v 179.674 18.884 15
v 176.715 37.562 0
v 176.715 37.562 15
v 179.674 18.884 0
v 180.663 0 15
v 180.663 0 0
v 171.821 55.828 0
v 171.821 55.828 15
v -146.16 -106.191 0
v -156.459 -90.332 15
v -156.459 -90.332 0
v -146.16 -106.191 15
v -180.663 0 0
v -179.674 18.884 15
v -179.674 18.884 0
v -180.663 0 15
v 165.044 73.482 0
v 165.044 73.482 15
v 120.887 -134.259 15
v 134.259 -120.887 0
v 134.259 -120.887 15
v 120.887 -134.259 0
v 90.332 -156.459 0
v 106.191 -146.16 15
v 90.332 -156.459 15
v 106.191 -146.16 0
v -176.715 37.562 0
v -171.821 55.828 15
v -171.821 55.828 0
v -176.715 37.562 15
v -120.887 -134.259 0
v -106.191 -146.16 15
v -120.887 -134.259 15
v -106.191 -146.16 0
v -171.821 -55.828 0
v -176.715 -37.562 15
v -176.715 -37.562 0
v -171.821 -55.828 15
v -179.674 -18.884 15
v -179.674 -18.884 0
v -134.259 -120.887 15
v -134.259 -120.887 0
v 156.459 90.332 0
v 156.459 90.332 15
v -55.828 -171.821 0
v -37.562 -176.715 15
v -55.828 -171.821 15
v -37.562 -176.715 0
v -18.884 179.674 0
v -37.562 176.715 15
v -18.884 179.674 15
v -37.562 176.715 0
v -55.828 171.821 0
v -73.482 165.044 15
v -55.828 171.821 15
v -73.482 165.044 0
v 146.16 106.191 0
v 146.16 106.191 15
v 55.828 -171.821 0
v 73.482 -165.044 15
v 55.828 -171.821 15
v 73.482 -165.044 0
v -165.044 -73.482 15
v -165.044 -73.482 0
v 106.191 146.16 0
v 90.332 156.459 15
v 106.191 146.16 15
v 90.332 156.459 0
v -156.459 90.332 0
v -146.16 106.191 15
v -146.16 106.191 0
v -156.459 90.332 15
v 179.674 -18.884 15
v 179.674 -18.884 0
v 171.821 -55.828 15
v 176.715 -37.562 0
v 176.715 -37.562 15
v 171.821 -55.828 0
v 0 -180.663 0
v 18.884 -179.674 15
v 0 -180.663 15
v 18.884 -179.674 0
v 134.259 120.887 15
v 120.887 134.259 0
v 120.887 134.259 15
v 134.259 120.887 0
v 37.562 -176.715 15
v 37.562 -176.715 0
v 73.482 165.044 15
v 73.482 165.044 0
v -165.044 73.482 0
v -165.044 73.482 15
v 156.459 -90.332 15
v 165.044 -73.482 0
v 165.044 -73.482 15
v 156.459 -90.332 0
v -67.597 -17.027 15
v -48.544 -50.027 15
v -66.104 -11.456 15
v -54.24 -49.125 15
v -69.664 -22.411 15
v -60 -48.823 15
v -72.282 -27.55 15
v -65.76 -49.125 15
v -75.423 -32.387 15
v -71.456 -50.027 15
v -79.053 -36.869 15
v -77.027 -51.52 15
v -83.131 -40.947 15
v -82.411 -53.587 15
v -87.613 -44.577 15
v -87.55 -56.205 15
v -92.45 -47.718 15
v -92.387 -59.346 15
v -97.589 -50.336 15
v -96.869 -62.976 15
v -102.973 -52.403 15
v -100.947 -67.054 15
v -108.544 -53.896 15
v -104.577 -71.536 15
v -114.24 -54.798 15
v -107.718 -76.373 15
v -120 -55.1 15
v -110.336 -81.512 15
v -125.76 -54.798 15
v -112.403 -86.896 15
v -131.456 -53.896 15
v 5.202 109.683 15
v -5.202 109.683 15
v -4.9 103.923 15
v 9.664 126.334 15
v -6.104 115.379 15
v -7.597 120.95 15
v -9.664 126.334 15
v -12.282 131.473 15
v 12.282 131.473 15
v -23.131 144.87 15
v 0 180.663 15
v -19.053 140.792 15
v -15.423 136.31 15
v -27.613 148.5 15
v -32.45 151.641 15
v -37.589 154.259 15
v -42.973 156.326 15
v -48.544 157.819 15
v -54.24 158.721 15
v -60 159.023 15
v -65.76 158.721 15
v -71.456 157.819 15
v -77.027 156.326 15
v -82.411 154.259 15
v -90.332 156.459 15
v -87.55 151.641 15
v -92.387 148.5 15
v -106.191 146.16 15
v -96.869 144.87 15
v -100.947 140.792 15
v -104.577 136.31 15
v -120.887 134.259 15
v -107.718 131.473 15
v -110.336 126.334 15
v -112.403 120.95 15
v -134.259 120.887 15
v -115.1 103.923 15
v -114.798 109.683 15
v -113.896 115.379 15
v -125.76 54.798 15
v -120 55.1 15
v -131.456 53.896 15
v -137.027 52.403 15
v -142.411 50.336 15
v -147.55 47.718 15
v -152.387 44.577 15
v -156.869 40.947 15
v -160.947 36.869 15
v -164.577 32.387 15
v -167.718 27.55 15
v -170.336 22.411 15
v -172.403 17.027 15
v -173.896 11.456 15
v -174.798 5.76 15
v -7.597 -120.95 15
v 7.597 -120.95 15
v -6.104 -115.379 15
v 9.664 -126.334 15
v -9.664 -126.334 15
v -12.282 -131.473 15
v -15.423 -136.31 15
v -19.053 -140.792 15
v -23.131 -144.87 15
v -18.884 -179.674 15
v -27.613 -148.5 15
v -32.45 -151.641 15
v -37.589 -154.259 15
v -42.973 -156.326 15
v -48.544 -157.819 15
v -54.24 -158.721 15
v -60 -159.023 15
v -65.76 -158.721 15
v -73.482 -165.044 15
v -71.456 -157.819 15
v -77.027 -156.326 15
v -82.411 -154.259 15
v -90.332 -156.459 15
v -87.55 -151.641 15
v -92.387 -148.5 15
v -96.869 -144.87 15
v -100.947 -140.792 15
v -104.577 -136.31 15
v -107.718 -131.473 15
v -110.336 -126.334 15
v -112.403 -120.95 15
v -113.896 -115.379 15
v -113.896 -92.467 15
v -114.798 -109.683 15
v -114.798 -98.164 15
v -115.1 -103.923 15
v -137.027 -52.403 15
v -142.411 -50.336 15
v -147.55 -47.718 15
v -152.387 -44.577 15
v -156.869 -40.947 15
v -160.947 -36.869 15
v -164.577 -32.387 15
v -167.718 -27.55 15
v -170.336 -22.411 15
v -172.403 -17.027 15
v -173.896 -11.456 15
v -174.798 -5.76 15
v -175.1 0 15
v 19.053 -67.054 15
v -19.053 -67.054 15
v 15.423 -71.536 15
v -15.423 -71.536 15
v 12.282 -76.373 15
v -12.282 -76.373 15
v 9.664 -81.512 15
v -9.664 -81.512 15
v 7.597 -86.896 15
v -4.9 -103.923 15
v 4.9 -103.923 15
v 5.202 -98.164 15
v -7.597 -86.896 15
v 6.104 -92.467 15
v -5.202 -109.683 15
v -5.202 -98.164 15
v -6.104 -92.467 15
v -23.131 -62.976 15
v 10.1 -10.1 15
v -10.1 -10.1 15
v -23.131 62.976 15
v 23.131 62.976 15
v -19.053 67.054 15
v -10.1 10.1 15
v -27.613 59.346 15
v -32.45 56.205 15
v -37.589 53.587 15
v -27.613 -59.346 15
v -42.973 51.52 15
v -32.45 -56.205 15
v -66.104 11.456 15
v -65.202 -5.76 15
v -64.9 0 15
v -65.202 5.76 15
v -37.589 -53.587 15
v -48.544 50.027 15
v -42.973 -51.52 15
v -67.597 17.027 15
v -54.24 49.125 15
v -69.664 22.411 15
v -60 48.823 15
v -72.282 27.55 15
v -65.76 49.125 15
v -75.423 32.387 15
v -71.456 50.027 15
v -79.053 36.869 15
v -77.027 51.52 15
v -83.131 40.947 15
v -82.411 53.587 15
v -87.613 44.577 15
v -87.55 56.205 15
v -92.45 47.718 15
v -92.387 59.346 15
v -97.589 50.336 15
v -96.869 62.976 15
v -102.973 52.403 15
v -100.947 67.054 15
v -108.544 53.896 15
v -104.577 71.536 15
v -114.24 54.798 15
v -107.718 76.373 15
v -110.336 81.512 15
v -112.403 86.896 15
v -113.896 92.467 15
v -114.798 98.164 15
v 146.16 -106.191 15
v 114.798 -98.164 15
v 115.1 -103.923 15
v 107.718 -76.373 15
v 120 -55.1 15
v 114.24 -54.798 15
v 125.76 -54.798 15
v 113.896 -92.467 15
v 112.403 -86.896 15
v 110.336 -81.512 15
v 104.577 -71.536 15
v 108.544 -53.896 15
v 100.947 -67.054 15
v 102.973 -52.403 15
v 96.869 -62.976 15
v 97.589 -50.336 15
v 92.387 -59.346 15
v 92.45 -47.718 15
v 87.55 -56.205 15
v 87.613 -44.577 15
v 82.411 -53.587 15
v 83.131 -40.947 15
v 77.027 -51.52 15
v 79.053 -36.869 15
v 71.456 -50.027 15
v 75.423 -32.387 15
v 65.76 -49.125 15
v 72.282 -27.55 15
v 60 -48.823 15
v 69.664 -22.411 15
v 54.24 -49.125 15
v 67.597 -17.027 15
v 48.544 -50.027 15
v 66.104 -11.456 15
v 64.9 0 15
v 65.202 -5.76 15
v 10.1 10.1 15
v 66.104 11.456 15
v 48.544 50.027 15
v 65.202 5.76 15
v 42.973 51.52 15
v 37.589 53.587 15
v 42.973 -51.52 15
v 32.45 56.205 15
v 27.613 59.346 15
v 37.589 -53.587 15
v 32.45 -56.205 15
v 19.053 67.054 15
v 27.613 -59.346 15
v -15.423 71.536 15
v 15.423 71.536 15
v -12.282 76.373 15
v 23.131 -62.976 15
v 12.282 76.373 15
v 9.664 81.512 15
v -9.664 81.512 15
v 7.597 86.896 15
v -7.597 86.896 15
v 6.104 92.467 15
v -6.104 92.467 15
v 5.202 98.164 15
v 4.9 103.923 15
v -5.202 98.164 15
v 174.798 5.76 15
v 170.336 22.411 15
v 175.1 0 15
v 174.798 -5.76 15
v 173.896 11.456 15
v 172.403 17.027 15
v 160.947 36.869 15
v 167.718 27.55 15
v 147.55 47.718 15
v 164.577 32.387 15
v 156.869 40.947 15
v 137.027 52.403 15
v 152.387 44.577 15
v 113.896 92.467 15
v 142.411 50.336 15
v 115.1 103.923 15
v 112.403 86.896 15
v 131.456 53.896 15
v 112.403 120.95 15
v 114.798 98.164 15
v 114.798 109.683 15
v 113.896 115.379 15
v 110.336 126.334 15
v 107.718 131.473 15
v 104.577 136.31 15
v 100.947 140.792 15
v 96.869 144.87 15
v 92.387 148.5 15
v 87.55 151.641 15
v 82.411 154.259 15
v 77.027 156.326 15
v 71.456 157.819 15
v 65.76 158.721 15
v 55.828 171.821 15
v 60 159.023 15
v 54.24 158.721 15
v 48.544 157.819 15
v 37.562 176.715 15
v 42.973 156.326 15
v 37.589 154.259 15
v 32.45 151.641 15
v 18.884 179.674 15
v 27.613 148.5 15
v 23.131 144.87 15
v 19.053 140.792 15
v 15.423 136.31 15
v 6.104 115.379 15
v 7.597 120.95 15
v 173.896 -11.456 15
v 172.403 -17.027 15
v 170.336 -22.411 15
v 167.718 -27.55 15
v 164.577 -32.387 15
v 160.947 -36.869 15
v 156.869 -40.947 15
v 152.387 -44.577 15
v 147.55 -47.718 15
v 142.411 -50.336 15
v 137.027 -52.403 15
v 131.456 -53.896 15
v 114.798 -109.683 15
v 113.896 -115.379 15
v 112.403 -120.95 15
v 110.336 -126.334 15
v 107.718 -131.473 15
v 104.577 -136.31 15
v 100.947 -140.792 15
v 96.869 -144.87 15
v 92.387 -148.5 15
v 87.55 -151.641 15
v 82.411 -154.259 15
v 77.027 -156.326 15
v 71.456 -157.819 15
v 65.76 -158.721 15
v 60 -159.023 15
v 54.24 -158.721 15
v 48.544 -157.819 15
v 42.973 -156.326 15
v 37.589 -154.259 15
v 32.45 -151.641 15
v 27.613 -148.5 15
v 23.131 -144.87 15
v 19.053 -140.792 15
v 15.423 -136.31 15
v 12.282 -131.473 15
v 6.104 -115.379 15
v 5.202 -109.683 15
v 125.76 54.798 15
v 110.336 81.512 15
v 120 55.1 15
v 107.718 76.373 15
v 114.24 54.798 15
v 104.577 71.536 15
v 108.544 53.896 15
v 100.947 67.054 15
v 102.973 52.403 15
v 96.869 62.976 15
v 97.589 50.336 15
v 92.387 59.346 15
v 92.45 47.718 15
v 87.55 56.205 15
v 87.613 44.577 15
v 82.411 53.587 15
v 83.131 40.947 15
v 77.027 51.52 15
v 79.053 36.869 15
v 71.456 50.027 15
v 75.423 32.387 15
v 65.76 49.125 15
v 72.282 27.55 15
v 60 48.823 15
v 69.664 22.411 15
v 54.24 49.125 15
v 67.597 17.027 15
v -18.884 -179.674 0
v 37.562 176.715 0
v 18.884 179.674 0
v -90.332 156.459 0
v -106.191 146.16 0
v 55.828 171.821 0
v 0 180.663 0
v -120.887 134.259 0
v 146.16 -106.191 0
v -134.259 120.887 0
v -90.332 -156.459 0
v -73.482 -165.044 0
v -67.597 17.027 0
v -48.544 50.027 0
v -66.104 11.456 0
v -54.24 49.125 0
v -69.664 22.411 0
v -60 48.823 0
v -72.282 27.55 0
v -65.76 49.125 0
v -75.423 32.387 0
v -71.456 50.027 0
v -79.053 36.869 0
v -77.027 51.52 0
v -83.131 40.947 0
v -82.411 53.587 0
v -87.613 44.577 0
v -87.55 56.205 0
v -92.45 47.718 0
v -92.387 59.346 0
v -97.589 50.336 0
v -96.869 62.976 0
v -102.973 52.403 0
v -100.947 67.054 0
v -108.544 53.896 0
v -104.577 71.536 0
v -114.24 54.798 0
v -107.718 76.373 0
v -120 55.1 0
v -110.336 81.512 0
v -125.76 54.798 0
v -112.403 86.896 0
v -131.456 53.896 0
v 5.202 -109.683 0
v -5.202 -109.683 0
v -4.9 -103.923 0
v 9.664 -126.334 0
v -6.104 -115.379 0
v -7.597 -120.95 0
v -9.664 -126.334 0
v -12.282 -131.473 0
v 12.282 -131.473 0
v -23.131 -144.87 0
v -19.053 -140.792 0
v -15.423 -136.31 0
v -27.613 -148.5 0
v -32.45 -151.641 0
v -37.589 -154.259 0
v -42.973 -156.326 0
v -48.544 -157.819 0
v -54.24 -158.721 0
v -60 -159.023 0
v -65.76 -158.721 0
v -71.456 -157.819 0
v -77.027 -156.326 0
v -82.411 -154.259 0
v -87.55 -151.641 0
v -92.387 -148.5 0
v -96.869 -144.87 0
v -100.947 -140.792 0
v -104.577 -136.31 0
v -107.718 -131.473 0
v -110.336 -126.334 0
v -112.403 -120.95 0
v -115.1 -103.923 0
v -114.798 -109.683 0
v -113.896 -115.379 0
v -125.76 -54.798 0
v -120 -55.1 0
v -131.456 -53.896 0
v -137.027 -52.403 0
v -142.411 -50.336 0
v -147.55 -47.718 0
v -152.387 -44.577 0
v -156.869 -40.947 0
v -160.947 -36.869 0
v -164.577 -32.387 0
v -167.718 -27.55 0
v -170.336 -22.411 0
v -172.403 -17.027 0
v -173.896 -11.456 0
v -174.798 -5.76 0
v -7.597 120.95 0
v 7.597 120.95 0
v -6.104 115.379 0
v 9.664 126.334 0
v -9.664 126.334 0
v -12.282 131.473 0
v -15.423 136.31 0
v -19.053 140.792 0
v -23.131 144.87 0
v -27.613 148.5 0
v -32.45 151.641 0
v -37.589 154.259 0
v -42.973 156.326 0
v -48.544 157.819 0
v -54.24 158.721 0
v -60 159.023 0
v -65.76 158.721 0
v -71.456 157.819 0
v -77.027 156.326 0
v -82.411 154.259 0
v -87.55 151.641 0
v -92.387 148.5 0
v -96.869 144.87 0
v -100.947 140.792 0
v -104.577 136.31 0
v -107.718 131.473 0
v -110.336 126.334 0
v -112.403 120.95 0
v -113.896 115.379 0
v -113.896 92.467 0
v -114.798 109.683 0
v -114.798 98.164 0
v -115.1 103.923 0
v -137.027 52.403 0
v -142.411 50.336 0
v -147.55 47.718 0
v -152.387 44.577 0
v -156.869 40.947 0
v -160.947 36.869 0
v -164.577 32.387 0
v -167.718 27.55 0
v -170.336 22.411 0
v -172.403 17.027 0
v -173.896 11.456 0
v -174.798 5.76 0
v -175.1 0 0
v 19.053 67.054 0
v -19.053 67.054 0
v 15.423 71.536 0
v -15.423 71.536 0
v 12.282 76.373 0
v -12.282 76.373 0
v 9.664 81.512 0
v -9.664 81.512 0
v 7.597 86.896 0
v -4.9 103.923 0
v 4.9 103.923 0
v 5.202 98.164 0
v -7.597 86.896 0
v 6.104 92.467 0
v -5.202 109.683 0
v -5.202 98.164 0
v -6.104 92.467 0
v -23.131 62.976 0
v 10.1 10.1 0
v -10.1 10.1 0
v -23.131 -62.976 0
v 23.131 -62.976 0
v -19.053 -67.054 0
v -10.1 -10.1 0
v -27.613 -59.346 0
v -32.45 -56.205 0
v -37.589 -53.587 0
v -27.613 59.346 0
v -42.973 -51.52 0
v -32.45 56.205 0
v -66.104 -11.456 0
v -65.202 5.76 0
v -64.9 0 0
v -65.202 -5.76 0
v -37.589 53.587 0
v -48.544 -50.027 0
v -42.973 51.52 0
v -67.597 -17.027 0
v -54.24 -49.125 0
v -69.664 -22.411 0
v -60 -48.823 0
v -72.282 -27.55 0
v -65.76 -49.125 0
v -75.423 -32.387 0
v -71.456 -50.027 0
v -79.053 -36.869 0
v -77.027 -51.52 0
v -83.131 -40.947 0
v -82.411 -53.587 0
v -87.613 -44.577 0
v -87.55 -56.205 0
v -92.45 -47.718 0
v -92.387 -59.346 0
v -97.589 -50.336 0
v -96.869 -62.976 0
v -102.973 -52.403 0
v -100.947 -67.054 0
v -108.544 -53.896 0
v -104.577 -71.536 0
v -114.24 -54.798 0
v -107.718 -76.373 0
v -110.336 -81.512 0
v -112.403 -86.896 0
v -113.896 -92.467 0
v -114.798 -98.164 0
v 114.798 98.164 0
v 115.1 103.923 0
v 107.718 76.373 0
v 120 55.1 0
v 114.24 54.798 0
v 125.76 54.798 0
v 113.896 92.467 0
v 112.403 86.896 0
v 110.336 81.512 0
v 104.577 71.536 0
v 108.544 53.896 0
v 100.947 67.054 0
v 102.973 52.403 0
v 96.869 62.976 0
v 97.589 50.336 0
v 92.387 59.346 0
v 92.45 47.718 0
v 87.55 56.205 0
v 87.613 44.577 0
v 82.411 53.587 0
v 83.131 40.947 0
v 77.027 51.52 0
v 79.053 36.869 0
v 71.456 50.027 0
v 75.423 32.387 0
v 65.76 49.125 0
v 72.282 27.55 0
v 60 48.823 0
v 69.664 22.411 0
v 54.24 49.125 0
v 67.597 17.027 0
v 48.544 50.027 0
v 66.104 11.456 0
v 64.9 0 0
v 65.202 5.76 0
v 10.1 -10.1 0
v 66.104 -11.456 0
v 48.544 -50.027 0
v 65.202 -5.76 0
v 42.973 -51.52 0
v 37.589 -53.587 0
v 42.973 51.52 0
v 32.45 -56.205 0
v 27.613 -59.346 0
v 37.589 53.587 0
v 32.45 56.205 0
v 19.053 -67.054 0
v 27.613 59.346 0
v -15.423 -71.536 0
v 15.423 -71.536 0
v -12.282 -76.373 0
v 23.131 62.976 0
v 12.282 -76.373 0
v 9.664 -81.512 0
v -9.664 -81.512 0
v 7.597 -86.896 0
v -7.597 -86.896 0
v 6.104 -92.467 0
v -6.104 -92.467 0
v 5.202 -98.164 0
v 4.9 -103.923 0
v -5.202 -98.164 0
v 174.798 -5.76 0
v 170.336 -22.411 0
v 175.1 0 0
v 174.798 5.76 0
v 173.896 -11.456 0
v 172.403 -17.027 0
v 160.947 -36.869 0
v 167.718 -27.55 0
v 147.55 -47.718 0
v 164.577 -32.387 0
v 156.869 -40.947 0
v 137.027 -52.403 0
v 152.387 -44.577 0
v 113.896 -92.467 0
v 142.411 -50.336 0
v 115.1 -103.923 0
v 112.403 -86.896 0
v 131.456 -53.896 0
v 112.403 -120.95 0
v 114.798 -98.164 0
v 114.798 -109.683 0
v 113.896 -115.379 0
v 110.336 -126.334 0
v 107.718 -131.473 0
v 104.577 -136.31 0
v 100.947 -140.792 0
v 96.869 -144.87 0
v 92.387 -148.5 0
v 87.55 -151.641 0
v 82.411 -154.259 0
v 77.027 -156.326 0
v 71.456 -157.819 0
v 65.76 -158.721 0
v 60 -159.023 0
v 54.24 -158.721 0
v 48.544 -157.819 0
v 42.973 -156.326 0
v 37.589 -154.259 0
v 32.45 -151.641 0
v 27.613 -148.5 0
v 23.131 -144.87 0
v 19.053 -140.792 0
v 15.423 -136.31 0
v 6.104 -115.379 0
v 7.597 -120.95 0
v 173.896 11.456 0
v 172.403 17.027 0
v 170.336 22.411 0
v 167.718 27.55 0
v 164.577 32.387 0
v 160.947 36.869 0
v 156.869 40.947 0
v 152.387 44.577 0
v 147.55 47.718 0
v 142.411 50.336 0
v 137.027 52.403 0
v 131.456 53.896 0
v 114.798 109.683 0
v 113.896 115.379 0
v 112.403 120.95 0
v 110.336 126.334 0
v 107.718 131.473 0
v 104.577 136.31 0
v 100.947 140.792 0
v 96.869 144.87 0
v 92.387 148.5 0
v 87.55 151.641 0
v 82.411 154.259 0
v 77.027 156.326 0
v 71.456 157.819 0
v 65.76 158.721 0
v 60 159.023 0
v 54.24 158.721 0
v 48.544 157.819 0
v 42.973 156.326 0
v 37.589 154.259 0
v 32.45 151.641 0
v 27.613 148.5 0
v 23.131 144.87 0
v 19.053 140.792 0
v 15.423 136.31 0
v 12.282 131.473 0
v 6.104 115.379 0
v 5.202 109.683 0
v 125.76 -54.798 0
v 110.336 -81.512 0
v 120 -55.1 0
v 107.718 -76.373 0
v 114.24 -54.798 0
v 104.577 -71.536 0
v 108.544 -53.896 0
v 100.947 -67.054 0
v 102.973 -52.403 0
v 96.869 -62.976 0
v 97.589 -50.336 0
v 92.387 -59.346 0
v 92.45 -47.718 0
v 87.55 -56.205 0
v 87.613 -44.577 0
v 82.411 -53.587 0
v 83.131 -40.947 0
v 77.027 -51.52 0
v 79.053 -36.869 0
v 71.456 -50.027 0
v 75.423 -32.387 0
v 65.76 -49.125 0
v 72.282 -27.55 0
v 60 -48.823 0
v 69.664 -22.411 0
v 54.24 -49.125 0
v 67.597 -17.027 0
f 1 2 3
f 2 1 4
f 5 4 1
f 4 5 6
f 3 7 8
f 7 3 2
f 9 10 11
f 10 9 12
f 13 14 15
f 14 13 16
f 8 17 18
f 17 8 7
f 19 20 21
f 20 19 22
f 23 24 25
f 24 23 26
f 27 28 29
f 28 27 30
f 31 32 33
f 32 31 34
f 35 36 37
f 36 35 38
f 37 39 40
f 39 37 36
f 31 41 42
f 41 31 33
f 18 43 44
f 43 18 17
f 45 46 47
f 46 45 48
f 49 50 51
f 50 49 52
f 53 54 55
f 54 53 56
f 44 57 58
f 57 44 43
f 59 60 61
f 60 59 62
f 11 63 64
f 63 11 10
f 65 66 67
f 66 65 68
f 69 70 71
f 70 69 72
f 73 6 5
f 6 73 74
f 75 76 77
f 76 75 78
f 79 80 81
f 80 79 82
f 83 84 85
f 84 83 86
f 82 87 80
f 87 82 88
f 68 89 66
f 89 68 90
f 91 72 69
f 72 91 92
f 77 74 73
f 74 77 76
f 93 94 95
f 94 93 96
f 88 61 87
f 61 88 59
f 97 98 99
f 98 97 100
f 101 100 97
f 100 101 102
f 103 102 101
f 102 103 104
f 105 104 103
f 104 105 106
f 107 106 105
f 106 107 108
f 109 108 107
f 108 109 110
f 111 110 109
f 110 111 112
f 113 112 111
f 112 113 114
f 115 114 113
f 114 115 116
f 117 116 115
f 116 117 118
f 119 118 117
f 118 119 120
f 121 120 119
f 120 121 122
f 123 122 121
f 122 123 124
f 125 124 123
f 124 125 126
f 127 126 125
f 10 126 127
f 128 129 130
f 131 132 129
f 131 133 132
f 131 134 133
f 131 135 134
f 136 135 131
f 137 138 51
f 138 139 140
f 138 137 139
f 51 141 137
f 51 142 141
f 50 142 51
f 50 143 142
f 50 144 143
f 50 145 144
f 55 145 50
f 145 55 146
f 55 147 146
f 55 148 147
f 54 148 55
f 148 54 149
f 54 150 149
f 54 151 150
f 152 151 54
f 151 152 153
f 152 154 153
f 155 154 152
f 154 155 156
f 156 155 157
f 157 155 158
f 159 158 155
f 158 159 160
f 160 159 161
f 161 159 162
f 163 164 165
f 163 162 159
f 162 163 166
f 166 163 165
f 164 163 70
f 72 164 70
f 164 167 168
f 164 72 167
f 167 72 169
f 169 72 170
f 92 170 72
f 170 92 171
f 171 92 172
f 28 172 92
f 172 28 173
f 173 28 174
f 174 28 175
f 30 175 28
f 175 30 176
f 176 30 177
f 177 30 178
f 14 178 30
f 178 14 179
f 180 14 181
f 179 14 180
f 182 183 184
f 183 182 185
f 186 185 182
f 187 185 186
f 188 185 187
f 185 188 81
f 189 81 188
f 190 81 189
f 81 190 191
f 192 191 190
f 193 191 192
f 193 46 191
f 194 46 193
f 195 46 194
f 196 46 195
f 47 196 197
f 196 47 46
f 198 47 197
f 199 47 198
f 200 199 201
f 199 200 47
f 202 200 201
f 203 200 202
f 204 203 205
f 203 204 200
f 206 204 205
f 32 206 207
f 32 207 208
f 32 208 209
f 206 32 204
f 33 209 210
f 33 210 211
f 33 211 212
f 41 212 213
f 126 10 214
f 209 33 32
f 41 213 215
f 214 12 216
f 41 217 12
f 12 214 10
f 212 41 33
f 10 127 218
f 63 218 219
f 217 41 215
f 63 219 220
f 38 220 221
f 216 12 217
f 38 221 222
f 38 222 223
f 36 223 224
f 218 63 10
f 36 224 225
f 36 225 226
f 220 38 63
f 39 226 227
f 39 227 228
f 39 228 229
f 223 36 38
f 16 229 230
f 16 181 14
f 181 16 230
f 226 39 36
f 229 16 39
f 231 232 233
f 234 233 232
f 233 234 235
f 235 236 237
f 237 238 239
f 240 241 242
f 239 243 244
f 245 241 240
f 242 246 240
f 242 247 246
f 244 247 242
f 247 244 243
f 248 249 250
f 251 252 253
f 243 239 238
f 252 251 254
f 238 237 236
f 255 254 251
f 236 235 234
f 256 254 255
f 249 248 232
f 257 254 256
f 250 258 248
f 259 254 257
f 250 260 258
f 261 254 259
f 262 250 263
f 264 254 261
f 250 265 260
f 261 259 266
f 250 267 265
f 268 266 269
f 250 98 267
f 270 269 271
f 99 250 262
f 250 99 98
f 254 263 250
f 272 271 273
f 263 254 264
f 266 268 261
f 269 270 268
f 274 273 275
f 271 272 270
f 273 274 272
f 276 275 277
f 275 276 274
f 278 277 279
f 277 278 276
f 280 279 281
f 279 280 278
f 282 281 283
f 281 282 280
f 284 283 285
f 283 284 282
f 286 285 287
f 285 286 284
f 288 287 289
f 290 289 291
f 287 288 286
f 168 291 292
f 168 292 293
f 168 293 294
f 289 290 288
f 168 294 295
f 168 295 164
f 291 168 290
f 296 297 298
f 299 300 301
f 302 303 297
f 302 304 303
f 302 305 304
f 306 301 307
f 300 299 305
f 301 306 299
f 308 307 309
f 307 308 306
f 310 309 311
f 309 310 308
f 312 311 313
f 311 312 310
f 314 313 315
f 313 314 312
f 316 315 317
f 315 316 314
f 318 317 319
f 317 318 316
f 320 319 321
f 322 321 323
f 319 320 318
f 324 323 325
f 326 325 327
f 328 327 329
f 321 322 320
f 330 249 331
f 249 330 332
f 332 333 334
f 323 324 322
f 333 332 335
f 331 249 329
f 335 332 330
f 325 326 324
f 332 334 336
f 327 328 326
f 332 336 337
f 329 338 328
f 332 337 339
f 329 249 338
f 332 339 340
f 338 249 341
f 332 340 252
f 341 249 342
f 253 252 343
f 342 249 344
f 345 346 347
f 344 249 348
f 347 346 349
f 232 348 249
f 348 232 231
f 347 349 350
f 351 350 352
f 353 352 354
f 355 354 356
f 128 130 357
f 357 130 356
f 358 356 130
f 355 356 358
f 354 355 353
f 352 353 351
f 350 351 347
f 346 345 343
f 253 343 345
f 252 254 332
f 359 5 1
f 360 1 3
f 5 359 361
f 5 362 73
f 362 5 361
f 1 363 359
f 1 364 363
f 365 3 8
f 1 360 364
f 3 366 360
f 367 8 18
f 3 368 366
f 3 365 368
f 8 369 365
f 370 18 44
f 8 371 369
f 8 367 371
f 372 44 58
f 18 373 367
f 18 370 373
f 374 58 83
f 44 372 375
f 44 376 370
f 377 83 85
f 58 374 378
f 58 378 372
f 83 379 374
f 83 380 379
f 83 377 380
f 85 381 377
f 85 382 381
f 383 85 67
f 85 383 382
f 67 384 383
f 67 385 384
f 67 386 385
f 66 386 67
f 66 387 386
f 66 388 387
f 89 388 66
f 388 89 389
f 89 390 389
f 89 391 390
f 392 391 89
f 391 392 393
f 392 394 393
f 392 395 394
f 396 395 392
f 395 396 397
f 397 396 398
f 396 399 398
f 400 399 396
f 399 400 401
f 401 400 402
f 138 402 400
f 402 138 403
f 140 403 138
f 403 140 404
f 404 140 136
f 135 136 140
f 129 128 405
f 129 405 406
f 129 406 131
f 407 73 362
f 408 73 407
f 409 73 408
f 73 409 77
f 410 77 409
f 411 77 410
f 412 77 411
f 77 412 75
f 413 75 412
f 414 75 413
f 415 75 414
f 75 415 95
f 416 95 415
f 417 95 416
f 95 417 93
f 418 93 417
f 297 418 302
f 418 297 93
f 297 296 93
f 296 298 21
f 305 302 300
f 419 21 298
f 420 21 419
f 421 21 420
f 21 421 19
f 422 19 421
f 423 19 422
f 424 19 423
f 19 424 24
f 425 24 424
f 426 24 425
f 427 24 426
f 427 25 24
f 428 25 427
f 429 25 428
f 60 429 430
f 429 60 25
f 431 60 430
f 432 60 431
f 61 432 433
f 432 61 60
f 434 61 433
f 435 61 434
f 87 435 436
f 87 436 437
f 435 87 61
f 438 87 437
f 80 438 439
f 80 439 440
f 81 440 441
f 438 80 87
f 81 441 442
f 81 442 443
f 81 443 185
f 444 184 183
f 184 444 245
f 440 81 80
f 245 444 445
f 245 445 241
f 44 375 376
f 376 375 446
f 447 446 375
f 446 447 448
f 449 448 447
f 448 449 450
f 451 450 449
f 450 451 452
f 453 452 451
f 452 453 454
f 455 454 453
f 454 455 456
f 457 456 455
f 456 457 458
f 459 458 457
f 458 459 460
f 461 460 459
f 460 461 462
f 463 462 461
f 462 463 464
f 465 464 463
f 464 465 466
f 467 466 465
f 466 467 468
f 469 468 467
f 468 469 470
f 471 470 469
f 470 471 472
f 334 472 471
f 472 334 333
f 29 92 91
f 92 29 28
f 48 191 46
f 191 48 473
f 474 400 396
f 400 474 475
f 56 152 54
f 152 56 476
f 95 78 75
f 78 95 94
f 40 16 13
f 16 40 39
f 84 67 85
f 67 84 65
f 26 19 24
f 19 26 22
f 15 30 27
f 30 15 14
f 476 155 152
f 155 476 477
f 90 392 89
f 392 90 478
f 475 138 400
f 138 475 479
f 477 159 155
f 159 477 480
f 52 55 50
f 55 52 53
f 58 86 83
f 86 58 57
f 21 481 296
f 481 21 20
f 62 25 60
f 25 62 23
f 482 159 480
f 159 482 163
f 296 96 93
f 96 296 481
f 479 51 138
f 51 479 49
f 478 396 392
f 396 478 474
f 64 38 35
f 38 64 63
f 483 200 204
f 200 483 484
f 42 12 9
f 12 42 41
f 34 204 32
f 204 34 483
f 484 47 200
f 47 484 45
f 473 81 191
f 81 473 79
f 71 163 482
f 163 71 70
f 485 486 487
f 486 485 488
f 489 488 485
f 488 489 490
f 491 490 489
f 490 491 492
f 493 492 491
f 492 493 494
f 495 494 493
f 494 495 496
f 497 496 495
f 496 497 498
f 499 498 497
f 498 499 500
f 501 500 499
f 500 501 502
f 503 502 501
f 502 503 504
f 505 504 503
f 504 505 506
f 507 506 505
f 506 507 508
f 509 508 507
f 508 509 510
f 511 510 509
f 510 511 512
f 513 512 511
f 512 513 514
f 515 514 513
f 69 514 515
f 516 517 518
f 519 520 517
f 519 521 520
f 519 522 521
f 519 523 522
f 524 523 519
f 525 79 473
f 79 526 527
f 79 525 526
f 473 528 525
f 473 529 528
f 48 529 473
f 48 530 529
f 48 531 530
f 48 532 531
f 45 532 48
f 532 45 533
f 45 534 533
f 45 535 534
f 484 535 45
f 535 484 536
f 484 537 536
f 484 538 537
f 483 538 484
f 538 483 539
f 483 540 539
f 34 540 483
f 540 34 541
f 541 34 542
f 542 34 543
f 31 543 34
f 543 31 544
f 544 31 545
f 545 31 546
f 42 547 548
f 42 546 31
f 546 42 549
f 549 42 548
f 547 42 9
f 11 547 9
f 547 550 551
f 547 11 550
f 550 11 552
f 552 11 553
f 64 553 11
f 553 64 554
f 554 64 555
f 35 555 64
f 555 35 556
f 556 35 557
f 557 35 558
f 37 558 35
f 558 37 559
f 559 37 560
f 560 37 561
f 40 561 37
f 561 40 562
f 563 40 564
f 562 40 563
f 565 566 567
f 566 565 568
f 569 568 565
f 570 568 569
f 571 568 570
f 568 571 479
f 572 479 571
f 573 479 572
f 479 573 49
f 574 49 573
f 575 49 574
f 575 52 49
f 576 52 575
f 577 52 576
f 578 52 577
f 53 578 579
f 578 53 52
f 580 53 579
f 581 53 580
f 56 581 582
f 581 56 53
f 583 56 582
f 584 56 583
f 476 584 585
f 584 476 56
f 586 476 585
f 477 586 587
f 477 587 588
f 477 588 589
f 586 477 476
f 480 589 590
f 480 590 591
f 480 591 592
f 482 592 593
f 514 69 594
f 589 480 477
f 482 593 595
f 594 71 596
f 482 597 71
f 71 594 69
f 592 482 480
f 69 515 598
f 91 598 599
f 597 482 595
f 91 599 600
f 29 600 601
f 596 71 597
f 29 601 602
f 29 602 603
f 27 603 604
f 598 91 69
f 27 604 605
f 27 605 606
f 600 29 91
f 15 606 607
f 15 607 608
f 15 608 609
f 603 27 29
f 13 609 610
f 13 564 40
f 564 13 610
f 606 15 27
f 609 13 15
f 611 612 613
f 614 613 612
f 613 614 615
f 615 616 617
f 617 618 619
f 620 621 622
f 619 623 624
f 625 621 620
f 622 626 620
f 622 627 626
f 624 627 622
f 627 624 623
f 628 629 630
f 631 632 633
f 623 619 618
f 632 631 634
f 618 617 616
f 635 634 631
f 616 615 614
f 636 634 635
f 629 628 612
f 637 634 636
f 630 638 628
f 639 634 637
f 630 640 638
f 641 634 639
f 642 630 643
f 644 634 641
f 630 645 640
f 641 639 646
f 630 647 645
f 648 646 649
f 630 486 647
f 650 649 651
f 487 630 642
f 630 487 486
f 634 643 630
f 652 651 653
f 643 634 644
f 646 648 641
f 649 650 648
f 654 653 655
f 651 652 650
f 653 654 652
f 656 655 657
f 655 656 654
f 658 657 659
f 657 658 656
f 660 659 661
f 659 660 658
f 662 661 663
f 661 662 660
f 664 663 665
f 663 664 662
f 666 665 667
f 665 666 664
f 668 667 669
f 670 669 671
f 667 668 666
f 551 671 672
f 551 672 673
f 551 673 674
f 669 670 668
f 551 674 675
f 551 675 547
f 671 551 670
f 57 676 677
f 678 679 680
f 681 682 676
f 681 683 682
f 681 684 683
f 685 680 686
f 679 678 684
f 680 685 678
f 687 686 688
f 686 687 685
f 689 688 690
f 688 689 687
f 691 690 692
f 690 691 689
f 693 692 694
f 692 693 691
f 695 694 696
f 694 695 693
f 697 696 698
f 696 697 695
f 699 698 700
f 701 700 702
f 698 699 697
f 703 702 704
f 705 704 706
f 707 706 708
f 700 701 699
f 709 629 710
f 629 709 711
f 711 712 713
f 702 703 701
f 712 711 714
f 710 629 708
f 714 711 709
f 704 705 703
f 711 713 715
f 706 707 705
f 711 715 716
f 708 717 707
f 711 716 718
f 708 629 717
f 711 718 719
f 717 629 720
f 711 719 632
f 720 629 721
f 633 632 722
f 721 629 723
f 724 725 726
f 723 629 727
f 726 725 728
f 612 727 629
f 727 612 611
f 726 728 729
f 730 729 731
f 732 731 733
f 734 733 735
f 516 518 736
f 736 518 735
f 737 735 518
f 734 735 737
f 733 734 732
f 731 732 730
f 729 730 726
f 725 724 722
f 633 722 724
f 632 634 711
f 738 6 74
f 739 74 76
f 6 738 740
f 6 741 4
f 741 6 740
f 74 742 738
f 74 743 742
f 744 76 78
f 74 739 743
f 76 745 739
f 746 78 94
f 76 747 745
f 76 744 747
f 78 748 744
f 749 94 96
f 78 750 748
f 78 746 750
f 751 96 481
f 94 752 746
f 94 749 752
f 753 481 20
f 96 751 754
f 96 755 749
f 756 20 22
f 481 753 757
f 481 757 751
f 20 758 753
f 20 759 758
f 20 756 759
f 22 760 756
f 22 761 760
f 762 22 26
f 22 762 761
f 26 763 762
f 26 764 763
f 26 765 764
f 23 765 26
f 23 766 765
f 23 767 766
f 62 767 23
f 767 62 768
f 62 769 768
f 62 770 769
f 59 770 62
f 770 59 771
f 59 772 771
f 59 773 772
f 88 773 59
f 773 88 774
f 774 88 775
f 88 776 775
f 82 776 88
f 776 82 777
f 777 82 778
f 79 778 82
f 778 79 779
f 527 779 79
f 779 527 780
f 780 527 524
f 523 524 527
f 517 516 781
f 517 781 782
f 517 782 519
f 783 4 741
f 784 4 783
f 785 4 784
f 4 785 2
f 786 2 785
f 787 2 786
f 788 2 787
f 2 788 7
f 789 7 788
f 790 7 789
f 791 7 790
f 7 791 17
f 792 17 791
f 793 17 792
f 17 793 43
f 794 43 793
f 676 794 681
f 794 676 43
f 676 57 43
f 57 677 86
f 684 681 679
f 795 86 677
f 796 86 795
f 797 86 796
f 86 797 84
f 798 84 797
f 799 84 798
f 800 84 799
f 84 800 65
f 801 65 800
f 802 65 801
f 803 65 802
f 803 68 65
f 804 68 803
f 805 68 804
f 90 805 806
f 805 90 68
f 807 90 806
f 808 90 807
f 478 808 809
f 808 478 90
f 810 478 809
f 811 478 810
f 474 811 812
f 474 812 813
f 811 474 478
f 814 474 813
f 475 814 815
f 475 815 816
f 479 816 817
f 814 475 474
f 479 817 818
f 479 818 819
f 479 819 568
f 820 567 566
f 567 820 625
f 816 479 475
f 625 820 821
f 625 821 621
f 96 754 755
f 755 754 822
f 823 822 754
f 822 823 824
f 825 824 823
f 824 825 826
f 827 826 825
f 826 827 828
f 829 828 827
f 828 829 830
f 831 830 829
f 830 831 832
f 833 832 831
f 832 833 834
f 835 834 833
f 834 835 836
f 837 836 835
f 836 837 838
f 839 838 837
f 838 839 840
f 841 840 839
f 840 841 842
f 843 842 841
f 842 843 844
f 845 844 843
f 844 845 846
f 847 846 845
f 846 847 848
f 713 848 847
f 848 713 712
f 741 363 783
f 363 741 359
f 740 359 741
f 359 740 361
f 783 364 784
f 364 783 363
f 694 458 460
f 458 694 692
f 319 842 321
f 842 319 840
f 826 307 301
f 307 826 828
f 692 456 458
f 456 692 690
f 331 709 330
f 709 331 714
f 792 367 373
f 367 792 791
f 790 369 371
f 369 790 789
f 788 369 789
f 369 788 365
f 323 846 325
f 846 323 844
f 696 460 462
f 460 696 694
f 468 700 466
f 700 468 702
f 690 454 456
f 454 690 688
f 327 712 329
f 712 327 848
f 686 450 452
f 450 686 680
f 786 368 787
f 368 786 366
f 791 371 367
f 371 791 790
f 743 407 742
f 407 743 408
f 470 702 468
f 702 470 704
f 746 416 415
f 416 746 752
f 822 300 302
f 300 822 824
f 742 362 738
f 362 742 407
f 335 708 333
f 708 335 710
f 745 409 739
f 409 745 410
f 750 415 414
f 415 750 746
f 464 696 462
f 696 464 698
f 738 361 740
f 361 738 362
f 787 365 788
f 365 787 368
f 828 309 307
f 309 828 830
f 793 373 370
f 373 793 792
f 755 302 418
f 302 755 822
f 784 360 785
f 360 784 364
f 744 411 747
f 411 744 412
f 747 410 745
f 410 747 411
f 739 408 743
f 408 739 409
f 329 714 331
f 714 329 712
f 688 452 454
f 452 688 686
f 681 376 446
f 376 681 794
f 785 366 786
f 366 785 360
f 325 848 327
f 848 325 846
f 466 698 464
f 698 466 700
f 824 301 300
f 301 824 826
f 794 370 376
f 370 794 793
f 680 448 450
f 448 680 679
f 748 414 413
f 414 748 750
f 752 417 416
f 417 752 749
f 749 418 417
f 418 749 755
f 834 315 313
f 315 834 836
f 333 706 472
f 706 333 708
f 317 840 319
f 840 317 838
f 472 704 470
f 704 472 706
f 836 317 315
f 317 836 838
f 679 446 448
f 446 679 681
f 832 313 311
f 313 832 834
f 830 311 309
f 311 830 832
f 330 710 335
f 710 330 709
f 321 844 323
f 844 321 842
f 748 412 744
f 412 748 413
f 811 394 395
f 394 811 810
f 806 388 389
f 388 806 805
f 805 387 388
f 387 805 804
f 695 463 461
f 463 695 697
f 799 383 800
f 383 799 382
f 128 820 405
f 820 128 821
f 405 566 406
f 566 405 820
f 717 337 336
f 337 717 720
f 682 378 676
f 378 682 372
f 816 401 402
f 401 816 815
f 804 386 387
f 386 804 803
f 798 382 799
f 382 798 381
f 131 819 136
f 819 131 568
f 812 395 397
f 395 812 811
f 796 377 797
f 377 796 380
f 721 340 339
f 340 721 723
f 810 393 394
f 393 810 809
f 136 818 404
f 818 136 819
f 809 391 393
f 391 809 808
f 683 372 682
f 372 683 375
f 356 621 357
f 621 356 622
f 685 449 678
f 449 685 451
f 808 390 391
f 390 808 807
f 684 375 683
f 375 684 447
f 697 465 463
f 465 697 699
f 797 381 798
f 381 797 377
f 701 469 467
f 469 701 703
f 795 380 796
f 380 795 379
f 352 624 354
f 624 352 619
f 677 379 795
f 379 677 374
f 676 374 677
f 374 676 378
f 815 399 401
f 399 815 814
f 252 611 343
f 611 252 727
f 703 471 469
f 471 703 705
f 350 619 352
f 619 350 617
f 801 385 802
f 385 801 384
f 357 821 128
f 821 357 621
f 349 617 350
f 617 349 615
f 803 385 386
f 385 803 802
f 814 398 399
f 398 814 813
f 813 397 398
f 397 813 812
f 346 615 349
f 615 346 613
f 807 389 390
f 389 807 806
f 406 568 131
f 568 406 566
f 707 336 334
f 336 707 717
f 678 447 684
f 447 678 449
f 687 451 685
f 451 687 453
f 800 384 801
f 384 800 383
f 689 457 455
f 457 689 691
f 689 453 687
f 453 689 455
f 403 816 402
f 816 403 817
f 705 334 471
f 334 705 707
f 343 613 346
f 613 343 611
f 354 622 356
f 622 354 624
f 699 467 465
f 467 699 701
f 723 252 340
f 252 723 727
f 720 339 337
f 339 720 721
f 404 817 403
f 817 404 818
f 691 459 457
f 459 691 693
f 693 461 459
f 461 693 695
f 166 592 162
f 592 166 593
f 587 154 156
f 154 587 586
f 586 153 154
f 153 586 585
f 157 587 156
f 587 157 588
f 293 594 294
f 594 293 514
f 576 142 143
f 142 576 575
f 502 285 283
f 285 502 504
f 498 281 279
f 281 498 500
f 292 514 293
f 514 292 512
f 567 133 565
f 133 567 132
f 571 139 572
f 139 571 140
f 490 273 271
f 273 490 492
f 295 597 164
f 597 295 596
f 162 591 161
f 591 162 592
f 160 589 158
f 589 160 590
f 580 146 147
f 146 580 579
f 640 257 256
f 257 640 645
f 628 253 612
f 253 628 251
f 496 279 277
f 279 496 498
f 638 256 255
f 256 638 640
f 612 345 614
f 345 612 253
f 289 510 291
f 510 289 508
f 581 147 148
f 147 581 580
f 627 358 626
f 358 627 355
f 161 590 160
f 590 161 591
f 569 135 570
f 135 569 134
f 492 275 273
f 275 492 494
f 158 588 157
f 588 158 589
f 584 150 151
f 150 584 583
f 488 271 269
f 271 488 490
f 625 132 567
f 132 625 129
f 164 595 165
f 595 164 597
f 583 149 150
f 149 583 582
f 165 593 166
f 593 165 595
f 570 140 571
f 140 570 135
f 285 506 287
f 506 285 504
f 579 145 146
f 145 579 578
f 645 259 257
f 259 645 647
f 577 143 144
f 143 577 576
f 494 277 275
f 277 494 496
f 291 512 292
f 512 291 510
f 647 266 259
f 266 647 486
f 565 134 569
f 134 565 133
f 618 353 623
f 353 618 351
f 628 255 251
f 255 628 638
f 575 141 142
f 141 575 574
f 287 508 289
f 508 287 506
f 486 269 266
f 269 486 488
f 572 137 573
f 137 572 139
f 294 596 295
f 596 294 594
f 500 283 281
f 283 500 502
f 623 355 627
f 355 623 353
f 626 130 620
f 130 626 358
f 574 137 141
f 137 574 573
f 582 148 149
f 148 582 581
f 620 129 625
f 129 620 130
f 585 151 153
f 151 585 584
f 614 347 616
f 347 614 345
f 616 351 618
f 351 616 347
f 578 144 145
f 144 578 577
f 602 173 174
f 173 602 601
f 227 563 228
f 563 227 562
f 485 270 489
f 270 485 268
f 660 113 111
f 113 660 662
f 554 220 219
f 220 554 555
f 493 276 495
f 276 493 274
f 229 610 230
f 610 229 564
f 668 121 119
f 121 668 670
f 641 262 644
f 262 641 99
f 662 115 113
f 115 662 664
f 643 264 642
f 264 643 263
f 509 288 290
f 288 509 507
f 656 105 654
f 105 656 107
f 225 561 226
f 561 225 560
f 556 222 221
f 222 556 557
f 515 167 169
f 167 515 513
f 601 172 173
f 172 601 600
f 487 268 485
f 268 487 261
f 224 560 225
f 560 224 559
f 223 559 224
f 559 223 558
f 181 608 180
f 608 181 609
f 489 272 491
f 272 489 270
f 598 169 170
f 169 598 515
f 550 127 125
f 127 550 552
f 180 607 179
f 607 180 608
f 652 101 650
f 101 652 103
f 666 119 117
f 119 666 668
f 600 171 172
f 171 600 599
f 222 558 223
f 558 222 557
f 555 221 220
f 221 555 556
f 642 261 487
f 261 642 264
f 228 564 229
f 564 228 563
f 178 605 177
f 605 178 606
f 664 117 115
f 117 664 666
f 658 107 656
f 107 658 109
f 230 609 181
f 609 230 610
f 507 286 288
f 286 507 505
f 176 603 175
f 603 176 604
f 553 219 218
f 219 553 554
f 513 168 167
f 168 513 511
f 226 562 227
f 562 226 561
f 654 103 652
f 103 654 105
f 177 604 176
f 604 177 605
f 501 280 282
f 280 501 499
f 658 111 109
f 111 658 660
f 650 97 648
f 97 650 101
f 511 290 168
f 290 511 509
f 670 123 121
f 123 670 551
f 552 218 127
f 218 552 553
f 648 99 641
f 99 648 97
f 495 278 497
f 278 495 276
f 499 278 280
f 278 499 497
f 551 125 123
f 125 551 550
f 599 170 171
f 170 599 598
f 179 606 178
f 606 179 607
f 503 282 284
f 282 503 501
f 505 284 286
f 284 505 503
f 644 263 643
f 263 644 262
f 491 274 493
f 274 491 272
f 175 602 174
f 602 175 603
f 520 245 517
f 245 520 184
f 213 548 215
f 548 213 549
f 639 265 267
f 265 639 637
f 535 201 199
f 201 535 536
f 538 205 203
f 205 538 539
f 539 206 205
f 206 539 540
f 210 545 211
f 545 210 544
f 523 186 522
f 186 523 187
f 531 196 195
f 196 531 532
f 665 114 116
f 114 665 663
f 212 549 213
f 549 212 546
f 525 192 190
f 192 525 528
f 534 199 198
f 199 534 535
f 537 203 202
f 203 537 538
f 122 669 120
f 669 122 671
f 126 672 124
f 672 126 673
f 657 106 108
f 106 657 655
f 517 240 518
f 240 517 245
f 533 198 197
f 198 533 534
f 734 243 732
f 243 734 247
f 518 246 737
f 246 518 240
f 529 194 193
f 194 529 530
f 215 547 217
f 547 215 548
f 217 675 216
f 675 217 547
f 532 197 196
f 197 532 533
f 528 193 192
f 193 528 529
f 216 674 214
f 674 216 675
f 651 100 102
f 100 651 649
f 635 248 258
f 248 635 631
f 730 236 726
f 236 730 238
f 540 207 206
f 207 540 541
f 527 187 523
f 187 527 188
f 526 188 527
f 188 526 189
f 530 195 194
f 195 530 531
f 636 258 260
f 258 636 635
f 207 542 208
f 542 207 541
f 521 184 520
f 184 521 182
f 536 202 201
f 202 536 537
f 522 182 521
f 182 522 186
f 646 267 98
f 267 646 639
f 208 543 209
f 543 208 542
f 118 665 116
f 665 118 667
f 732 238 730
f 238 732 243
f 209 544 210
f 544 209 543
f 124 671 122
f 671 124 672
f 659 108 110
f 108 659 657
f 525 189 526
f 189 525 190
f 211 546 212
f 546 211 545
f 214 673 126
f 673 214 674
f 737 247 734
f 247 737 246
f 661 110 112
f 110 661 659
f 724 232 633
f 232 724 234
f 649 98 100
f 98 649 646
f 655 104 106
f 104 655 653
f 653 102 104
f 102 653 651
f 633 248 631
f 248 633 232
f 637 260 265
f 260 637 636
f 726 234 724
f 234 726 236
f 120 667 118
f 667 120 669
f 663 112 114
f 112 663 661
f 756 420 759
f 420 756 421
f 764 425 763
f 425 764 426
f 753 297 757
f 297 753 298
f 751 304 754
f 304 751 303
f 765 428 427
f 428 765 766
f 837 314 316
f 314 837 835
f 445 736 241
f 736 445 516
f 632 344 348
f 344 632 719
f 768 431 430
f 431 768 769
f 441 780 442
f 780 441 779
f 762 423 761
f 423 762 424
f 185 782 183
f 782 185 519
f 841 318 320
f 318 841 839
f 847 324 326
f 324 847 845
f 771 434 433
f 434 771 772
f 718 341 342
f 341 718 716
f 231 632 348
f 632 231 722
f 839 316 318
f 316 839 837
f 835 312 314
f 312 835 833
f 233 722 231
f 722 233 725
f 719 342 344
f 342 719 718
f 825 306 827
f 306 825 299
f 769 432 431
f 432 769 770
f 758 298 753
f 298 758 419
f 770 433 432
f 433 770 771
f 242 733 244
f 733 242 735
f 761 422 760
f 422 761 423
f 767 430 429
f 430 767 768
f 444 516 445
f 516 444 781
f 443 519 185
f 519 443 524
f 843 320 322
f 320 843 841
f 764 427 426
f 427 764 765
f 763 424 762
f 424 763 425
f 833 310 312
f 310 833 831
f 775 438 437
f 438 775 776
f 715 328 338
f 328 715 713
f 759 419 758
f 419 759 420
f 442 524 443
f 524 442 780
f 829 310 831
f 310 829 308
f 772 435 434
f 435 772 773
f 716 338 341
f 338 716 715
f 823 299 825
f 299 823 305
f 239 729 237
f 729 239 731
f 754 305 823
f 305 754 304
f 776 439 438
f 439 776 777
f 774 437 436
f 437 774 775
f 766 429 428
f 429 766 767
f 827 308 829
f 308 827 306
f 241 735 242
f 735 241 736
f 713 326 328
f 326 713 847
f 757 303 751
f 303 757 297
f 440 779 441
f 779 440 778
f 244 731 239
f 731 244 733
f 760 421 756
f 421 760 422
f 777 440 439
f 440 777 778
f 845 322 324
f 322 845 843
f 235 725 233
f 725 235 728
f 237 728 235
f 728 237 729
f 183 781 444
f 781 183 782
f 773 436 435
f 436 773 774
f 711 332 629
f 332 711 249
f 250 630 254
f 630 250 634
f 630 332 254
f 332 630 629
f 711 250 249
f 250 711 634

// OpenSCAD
// file: _params.scad
// =========================================================================
// 공유 파라미터 (모든 개별 부품 파일에서 include)
// 메인 어셈블리: cup_z_x_catrage_frame_water_mic_anti_3030.scad 에서 추출
// 프레임: 600 × 420 × 700mm (3030 프로파일, Y=0 대칭)
// =========================================================================

$fn = 60;  // 부품 출력용 고해상도
GLOBAL_TOLERANCE = 0.2;

// --- [1] 하부 기성품 및 원통 파라미터 ---
X_RAIL_LEN = 290.0;
X_BLOCK_W = 30.0; X_BLOCK_L = 32.0;   // 신규 X슬라이더 블록 (폭 30mm × 길이 32mm)
X_PITCH_X = 20.0; X_PITCH_Y = 20.0;   // 체결 홀 피치 (20 × 20mm, M3 나사탭 4개)
X_RAIL_W = 30.0;  X_RAIL_H = 20.0;   // 레일 폭 30mm (레일 바닥~블록 윗면 높이 29mm 반영)
X_TOTAL_H = 29.0;                    // 레일 바닥에서 슬라이더 블록 윗면까지의 높이

MOTOR_W = 42.0;      MOTOR_PITCH = 31.0; MOTOR_HOLE_D = 3.5;    
MOTOR_BOSS_D = 22.0; MOTOR_BOSS_H = 2.0; SCREW_D = 8.0;         
MOT_BODY_L = 41.0;   SHAFT_L = 24.0;     // 실측 NEMA17 몸통 41mm / 축 돌출 24mm

CUP_ID = 99.5;  CUP_WALL = 5.0; CUP_OD = 110.0;     // 아크릴 원통 OD110/ID100
CUP_H = 180.0;   CAGE_H = 60.0;  FLOOR_H = 10.0; PISTON_H = 20.0;     

LIP_D = 30.0;    LIP_H = 5.0;    LEAK_DRAIN_D = 4.0;    
GUIDE_PIPE_D = 8.0; BUSHING_OD = 12.0; BUSHING_H = 8.0;       
DRAIN_RADIUS = 35.0; DRAIN_D = 8.0;        

Y_OFFSET = 85.0; BRKT_H = 12.0; BRKT_D = 122.0; BRKT_ID = 62.0; Z_MOUNT_PCD = 86.0;   

// --- [2] 아크릴 파이프 및 상부 카트리지 ---
ACRYL_ID = 100.0; ACRYL_T = 5.0; ACRYL_OD = ACRYL_ID + (ACRYL_T * 2);  // OD110 (아크릴집 106 재고없음 → 컵과 동일 규격)

REVOLVER_PCD = 240.0;     // 인접 카트리지 웹 9.8mm 확보 (OD110 대응, 230→240)
CARTRIDGE_OD = REVOLVER_PCD + ACRYL_OD + 8; 
TOP_PLATE_H = 15.0;       // 아크릴 15T 통판 (보스홀 단 깊이 10mm)

HUB_D = 60.0;            
SHAFT_D = 12.0;          
HUB_WALL = 4.0;          
HUB_H = 15.0;             // 아크릴 5T × 3장 적층 — 파이프 130mm 대응
POCKET_DEPTH = 5.0;
MID_HUB_Z = 63.5;          // 중단 허브 하면 Z (벨트 중심 Z=71.0mm 정렬, 풀리 상단 Z=75.0mm = 축상단-1mm)
UPPER_HUB_Z = 135.0;       // 상단 허브 하면 Z (전체 135+15=150 유지)
BOSS_OD = 35.0;
BOSS_H = 11.0;             // 보스11 + 와셔1 = 12, 리세스10 → 허브 2mm 공중

// --- [3] GT2 벨트 구동 시스템 ---
GT2_PITCH     = 2.0;
GT2_BELT_W    = 6.0;
BIG_PULLEY_TEETH = 566;
BIG_PULLEY_PD = BIG_PULLEY_TEETH * GT2_PITCH / PI;
BIG_PULLEY_OD = BIG_PULLEY_PD + 1.0;
SMALL_PULLEY_TEETH = 20;
SMALL_PULLEY_PD = SMALL_PULLEY_TEETH * GT2_PITCH / PI;
SMALL_PULLEY_OD = SMALL_PULLEY_PD + 1.0;

BELT_MOTOR_X = -300;
BELT_MOTOR_Y = -155.5;
BRKT_MOTOR_H = 25.0;
BRKT_MOTOR_W = 45.0;        // 브래킷 폭 45mm (프로파일 간섭 회피 복원)
SLOT_LEN = 10.0;
FLAG_W = 15.0;  FLAG_H = 8.0;  FLAG_T = 1.5;

X_POS_MEASURE = 170.0;   // 측정 브래킷 X좌표 (X_M~X_R 정중앙, X대칭)

// --- [4] 3030 프레임 경계 (600×430×700mm) ---
PF = 30;             // 3030 알루미늄 프로파일
WASHER_T = 1.0;     

X_L = -320;
X_M = 60;
X_R = 250;
Y_F = -210;          // 전방 (대칭: -210+30=-180, Y=0 중심)
Y_B = 180;           // 후방 (대칭: 180+30=210, Y=0 중심) — 메인파일과 동기화

Z_BOT = -480;
Z_RAIL = -322;
Z_MID = -TOP_PLATE_H - PF;
Z_TOP = 220;

SUPPORT_PILLAR_H = Z_TOP - PF;

SHAFT_SQ = 20;       // 2020 사각 회전축

// 사각 축 홀 크기
SQ = SHAFT_SQ + GLOBAL_TOLERANCE;  // 20.2mm

// --- 리볼버/컵 축 정렬 (보스홀=판 중심에 리볼버 정렬) ---
REVOLVER_CX = (X_L + X_M + PF)/2;        // 판 중심 = 보스홀 = 리볼버 회전축 (-115)
DROP_X      = REVOLVER_CX + REVOLVER_PCD/2;  // 링 드롭 / 컵 적재 축 (+5)

FLANGE_Z = 52.0;       // 모터 전면 안착 높이 (Z=52mm -> 축 상단 Z=76mm, 풀리 결합)

// --- [5] 모터 체결홀 (이미 제작 완료된 15T 상판 원본 도면 수치 100% 유지) ---
MOTOR_BOLT_PITCH     = 25.0;      // Y피치 (Y = ±12.5mm)
MOTOR_BOLT_X_NOMINAL = X_L + 55;  // 1열: 상판 좌단 55 (모터축 기준 +35mm = X=-265mm)
MOTOR_BOLT_X_SHIFT   = X_L + 40;  // 2열: 상판 좌단 40 (모터축 기준 +20mm = X=-280mm)

// 모터 마운트 볼트 카운터보어 (단볼트용 — 브래킷 두께 25 중 깊게 파냄)
MOTOR_CB_D     = 6.5;            // M3 캡볼트 머리 클리어런스
MOTOR_CB_DEPTH = 19;             // 카운터보어 깊이 (잔여 통과 6mm → M3×10 단볼트)
// main file
// =========================================================================
// [부품] 중단 허브 (Middle Hub)
// 가공: 레이저커팅 아크릴 5T × 3장 적층
// 원점: 허브 하면 = Z=0, 중심 = XY 원점
// =========================================================================
include <_params.scad>

difference() {
    union() {
        cylinder(d=CARTRIDGE_OD, h=HUB_H);
        // 벨트 외주 림
        difference() {
            cylinder(d=BIG_PULLEY_OD, h=HUB_H);
            translate([0, 0, -1]) cylinder(d=BIG_PULLEY_OD - 14, h=HUB_H + 2);
        }
    }
    // 사각 축 관통
    translate([-SQ/2, -SQ/2, -1]) cube([SQ, SQ, HUB_H + 2]);
    // 6× 파이프 관통홀
    for(a = [0 : 60 : 359]) rotate([0, 0, a])
        translate([REVOLVER_PCD/2, 0, -1])
            cylinder(d=ACRYL_OD + GLOBAL_TOLERANCE, h=HUB_H + 2);
}
